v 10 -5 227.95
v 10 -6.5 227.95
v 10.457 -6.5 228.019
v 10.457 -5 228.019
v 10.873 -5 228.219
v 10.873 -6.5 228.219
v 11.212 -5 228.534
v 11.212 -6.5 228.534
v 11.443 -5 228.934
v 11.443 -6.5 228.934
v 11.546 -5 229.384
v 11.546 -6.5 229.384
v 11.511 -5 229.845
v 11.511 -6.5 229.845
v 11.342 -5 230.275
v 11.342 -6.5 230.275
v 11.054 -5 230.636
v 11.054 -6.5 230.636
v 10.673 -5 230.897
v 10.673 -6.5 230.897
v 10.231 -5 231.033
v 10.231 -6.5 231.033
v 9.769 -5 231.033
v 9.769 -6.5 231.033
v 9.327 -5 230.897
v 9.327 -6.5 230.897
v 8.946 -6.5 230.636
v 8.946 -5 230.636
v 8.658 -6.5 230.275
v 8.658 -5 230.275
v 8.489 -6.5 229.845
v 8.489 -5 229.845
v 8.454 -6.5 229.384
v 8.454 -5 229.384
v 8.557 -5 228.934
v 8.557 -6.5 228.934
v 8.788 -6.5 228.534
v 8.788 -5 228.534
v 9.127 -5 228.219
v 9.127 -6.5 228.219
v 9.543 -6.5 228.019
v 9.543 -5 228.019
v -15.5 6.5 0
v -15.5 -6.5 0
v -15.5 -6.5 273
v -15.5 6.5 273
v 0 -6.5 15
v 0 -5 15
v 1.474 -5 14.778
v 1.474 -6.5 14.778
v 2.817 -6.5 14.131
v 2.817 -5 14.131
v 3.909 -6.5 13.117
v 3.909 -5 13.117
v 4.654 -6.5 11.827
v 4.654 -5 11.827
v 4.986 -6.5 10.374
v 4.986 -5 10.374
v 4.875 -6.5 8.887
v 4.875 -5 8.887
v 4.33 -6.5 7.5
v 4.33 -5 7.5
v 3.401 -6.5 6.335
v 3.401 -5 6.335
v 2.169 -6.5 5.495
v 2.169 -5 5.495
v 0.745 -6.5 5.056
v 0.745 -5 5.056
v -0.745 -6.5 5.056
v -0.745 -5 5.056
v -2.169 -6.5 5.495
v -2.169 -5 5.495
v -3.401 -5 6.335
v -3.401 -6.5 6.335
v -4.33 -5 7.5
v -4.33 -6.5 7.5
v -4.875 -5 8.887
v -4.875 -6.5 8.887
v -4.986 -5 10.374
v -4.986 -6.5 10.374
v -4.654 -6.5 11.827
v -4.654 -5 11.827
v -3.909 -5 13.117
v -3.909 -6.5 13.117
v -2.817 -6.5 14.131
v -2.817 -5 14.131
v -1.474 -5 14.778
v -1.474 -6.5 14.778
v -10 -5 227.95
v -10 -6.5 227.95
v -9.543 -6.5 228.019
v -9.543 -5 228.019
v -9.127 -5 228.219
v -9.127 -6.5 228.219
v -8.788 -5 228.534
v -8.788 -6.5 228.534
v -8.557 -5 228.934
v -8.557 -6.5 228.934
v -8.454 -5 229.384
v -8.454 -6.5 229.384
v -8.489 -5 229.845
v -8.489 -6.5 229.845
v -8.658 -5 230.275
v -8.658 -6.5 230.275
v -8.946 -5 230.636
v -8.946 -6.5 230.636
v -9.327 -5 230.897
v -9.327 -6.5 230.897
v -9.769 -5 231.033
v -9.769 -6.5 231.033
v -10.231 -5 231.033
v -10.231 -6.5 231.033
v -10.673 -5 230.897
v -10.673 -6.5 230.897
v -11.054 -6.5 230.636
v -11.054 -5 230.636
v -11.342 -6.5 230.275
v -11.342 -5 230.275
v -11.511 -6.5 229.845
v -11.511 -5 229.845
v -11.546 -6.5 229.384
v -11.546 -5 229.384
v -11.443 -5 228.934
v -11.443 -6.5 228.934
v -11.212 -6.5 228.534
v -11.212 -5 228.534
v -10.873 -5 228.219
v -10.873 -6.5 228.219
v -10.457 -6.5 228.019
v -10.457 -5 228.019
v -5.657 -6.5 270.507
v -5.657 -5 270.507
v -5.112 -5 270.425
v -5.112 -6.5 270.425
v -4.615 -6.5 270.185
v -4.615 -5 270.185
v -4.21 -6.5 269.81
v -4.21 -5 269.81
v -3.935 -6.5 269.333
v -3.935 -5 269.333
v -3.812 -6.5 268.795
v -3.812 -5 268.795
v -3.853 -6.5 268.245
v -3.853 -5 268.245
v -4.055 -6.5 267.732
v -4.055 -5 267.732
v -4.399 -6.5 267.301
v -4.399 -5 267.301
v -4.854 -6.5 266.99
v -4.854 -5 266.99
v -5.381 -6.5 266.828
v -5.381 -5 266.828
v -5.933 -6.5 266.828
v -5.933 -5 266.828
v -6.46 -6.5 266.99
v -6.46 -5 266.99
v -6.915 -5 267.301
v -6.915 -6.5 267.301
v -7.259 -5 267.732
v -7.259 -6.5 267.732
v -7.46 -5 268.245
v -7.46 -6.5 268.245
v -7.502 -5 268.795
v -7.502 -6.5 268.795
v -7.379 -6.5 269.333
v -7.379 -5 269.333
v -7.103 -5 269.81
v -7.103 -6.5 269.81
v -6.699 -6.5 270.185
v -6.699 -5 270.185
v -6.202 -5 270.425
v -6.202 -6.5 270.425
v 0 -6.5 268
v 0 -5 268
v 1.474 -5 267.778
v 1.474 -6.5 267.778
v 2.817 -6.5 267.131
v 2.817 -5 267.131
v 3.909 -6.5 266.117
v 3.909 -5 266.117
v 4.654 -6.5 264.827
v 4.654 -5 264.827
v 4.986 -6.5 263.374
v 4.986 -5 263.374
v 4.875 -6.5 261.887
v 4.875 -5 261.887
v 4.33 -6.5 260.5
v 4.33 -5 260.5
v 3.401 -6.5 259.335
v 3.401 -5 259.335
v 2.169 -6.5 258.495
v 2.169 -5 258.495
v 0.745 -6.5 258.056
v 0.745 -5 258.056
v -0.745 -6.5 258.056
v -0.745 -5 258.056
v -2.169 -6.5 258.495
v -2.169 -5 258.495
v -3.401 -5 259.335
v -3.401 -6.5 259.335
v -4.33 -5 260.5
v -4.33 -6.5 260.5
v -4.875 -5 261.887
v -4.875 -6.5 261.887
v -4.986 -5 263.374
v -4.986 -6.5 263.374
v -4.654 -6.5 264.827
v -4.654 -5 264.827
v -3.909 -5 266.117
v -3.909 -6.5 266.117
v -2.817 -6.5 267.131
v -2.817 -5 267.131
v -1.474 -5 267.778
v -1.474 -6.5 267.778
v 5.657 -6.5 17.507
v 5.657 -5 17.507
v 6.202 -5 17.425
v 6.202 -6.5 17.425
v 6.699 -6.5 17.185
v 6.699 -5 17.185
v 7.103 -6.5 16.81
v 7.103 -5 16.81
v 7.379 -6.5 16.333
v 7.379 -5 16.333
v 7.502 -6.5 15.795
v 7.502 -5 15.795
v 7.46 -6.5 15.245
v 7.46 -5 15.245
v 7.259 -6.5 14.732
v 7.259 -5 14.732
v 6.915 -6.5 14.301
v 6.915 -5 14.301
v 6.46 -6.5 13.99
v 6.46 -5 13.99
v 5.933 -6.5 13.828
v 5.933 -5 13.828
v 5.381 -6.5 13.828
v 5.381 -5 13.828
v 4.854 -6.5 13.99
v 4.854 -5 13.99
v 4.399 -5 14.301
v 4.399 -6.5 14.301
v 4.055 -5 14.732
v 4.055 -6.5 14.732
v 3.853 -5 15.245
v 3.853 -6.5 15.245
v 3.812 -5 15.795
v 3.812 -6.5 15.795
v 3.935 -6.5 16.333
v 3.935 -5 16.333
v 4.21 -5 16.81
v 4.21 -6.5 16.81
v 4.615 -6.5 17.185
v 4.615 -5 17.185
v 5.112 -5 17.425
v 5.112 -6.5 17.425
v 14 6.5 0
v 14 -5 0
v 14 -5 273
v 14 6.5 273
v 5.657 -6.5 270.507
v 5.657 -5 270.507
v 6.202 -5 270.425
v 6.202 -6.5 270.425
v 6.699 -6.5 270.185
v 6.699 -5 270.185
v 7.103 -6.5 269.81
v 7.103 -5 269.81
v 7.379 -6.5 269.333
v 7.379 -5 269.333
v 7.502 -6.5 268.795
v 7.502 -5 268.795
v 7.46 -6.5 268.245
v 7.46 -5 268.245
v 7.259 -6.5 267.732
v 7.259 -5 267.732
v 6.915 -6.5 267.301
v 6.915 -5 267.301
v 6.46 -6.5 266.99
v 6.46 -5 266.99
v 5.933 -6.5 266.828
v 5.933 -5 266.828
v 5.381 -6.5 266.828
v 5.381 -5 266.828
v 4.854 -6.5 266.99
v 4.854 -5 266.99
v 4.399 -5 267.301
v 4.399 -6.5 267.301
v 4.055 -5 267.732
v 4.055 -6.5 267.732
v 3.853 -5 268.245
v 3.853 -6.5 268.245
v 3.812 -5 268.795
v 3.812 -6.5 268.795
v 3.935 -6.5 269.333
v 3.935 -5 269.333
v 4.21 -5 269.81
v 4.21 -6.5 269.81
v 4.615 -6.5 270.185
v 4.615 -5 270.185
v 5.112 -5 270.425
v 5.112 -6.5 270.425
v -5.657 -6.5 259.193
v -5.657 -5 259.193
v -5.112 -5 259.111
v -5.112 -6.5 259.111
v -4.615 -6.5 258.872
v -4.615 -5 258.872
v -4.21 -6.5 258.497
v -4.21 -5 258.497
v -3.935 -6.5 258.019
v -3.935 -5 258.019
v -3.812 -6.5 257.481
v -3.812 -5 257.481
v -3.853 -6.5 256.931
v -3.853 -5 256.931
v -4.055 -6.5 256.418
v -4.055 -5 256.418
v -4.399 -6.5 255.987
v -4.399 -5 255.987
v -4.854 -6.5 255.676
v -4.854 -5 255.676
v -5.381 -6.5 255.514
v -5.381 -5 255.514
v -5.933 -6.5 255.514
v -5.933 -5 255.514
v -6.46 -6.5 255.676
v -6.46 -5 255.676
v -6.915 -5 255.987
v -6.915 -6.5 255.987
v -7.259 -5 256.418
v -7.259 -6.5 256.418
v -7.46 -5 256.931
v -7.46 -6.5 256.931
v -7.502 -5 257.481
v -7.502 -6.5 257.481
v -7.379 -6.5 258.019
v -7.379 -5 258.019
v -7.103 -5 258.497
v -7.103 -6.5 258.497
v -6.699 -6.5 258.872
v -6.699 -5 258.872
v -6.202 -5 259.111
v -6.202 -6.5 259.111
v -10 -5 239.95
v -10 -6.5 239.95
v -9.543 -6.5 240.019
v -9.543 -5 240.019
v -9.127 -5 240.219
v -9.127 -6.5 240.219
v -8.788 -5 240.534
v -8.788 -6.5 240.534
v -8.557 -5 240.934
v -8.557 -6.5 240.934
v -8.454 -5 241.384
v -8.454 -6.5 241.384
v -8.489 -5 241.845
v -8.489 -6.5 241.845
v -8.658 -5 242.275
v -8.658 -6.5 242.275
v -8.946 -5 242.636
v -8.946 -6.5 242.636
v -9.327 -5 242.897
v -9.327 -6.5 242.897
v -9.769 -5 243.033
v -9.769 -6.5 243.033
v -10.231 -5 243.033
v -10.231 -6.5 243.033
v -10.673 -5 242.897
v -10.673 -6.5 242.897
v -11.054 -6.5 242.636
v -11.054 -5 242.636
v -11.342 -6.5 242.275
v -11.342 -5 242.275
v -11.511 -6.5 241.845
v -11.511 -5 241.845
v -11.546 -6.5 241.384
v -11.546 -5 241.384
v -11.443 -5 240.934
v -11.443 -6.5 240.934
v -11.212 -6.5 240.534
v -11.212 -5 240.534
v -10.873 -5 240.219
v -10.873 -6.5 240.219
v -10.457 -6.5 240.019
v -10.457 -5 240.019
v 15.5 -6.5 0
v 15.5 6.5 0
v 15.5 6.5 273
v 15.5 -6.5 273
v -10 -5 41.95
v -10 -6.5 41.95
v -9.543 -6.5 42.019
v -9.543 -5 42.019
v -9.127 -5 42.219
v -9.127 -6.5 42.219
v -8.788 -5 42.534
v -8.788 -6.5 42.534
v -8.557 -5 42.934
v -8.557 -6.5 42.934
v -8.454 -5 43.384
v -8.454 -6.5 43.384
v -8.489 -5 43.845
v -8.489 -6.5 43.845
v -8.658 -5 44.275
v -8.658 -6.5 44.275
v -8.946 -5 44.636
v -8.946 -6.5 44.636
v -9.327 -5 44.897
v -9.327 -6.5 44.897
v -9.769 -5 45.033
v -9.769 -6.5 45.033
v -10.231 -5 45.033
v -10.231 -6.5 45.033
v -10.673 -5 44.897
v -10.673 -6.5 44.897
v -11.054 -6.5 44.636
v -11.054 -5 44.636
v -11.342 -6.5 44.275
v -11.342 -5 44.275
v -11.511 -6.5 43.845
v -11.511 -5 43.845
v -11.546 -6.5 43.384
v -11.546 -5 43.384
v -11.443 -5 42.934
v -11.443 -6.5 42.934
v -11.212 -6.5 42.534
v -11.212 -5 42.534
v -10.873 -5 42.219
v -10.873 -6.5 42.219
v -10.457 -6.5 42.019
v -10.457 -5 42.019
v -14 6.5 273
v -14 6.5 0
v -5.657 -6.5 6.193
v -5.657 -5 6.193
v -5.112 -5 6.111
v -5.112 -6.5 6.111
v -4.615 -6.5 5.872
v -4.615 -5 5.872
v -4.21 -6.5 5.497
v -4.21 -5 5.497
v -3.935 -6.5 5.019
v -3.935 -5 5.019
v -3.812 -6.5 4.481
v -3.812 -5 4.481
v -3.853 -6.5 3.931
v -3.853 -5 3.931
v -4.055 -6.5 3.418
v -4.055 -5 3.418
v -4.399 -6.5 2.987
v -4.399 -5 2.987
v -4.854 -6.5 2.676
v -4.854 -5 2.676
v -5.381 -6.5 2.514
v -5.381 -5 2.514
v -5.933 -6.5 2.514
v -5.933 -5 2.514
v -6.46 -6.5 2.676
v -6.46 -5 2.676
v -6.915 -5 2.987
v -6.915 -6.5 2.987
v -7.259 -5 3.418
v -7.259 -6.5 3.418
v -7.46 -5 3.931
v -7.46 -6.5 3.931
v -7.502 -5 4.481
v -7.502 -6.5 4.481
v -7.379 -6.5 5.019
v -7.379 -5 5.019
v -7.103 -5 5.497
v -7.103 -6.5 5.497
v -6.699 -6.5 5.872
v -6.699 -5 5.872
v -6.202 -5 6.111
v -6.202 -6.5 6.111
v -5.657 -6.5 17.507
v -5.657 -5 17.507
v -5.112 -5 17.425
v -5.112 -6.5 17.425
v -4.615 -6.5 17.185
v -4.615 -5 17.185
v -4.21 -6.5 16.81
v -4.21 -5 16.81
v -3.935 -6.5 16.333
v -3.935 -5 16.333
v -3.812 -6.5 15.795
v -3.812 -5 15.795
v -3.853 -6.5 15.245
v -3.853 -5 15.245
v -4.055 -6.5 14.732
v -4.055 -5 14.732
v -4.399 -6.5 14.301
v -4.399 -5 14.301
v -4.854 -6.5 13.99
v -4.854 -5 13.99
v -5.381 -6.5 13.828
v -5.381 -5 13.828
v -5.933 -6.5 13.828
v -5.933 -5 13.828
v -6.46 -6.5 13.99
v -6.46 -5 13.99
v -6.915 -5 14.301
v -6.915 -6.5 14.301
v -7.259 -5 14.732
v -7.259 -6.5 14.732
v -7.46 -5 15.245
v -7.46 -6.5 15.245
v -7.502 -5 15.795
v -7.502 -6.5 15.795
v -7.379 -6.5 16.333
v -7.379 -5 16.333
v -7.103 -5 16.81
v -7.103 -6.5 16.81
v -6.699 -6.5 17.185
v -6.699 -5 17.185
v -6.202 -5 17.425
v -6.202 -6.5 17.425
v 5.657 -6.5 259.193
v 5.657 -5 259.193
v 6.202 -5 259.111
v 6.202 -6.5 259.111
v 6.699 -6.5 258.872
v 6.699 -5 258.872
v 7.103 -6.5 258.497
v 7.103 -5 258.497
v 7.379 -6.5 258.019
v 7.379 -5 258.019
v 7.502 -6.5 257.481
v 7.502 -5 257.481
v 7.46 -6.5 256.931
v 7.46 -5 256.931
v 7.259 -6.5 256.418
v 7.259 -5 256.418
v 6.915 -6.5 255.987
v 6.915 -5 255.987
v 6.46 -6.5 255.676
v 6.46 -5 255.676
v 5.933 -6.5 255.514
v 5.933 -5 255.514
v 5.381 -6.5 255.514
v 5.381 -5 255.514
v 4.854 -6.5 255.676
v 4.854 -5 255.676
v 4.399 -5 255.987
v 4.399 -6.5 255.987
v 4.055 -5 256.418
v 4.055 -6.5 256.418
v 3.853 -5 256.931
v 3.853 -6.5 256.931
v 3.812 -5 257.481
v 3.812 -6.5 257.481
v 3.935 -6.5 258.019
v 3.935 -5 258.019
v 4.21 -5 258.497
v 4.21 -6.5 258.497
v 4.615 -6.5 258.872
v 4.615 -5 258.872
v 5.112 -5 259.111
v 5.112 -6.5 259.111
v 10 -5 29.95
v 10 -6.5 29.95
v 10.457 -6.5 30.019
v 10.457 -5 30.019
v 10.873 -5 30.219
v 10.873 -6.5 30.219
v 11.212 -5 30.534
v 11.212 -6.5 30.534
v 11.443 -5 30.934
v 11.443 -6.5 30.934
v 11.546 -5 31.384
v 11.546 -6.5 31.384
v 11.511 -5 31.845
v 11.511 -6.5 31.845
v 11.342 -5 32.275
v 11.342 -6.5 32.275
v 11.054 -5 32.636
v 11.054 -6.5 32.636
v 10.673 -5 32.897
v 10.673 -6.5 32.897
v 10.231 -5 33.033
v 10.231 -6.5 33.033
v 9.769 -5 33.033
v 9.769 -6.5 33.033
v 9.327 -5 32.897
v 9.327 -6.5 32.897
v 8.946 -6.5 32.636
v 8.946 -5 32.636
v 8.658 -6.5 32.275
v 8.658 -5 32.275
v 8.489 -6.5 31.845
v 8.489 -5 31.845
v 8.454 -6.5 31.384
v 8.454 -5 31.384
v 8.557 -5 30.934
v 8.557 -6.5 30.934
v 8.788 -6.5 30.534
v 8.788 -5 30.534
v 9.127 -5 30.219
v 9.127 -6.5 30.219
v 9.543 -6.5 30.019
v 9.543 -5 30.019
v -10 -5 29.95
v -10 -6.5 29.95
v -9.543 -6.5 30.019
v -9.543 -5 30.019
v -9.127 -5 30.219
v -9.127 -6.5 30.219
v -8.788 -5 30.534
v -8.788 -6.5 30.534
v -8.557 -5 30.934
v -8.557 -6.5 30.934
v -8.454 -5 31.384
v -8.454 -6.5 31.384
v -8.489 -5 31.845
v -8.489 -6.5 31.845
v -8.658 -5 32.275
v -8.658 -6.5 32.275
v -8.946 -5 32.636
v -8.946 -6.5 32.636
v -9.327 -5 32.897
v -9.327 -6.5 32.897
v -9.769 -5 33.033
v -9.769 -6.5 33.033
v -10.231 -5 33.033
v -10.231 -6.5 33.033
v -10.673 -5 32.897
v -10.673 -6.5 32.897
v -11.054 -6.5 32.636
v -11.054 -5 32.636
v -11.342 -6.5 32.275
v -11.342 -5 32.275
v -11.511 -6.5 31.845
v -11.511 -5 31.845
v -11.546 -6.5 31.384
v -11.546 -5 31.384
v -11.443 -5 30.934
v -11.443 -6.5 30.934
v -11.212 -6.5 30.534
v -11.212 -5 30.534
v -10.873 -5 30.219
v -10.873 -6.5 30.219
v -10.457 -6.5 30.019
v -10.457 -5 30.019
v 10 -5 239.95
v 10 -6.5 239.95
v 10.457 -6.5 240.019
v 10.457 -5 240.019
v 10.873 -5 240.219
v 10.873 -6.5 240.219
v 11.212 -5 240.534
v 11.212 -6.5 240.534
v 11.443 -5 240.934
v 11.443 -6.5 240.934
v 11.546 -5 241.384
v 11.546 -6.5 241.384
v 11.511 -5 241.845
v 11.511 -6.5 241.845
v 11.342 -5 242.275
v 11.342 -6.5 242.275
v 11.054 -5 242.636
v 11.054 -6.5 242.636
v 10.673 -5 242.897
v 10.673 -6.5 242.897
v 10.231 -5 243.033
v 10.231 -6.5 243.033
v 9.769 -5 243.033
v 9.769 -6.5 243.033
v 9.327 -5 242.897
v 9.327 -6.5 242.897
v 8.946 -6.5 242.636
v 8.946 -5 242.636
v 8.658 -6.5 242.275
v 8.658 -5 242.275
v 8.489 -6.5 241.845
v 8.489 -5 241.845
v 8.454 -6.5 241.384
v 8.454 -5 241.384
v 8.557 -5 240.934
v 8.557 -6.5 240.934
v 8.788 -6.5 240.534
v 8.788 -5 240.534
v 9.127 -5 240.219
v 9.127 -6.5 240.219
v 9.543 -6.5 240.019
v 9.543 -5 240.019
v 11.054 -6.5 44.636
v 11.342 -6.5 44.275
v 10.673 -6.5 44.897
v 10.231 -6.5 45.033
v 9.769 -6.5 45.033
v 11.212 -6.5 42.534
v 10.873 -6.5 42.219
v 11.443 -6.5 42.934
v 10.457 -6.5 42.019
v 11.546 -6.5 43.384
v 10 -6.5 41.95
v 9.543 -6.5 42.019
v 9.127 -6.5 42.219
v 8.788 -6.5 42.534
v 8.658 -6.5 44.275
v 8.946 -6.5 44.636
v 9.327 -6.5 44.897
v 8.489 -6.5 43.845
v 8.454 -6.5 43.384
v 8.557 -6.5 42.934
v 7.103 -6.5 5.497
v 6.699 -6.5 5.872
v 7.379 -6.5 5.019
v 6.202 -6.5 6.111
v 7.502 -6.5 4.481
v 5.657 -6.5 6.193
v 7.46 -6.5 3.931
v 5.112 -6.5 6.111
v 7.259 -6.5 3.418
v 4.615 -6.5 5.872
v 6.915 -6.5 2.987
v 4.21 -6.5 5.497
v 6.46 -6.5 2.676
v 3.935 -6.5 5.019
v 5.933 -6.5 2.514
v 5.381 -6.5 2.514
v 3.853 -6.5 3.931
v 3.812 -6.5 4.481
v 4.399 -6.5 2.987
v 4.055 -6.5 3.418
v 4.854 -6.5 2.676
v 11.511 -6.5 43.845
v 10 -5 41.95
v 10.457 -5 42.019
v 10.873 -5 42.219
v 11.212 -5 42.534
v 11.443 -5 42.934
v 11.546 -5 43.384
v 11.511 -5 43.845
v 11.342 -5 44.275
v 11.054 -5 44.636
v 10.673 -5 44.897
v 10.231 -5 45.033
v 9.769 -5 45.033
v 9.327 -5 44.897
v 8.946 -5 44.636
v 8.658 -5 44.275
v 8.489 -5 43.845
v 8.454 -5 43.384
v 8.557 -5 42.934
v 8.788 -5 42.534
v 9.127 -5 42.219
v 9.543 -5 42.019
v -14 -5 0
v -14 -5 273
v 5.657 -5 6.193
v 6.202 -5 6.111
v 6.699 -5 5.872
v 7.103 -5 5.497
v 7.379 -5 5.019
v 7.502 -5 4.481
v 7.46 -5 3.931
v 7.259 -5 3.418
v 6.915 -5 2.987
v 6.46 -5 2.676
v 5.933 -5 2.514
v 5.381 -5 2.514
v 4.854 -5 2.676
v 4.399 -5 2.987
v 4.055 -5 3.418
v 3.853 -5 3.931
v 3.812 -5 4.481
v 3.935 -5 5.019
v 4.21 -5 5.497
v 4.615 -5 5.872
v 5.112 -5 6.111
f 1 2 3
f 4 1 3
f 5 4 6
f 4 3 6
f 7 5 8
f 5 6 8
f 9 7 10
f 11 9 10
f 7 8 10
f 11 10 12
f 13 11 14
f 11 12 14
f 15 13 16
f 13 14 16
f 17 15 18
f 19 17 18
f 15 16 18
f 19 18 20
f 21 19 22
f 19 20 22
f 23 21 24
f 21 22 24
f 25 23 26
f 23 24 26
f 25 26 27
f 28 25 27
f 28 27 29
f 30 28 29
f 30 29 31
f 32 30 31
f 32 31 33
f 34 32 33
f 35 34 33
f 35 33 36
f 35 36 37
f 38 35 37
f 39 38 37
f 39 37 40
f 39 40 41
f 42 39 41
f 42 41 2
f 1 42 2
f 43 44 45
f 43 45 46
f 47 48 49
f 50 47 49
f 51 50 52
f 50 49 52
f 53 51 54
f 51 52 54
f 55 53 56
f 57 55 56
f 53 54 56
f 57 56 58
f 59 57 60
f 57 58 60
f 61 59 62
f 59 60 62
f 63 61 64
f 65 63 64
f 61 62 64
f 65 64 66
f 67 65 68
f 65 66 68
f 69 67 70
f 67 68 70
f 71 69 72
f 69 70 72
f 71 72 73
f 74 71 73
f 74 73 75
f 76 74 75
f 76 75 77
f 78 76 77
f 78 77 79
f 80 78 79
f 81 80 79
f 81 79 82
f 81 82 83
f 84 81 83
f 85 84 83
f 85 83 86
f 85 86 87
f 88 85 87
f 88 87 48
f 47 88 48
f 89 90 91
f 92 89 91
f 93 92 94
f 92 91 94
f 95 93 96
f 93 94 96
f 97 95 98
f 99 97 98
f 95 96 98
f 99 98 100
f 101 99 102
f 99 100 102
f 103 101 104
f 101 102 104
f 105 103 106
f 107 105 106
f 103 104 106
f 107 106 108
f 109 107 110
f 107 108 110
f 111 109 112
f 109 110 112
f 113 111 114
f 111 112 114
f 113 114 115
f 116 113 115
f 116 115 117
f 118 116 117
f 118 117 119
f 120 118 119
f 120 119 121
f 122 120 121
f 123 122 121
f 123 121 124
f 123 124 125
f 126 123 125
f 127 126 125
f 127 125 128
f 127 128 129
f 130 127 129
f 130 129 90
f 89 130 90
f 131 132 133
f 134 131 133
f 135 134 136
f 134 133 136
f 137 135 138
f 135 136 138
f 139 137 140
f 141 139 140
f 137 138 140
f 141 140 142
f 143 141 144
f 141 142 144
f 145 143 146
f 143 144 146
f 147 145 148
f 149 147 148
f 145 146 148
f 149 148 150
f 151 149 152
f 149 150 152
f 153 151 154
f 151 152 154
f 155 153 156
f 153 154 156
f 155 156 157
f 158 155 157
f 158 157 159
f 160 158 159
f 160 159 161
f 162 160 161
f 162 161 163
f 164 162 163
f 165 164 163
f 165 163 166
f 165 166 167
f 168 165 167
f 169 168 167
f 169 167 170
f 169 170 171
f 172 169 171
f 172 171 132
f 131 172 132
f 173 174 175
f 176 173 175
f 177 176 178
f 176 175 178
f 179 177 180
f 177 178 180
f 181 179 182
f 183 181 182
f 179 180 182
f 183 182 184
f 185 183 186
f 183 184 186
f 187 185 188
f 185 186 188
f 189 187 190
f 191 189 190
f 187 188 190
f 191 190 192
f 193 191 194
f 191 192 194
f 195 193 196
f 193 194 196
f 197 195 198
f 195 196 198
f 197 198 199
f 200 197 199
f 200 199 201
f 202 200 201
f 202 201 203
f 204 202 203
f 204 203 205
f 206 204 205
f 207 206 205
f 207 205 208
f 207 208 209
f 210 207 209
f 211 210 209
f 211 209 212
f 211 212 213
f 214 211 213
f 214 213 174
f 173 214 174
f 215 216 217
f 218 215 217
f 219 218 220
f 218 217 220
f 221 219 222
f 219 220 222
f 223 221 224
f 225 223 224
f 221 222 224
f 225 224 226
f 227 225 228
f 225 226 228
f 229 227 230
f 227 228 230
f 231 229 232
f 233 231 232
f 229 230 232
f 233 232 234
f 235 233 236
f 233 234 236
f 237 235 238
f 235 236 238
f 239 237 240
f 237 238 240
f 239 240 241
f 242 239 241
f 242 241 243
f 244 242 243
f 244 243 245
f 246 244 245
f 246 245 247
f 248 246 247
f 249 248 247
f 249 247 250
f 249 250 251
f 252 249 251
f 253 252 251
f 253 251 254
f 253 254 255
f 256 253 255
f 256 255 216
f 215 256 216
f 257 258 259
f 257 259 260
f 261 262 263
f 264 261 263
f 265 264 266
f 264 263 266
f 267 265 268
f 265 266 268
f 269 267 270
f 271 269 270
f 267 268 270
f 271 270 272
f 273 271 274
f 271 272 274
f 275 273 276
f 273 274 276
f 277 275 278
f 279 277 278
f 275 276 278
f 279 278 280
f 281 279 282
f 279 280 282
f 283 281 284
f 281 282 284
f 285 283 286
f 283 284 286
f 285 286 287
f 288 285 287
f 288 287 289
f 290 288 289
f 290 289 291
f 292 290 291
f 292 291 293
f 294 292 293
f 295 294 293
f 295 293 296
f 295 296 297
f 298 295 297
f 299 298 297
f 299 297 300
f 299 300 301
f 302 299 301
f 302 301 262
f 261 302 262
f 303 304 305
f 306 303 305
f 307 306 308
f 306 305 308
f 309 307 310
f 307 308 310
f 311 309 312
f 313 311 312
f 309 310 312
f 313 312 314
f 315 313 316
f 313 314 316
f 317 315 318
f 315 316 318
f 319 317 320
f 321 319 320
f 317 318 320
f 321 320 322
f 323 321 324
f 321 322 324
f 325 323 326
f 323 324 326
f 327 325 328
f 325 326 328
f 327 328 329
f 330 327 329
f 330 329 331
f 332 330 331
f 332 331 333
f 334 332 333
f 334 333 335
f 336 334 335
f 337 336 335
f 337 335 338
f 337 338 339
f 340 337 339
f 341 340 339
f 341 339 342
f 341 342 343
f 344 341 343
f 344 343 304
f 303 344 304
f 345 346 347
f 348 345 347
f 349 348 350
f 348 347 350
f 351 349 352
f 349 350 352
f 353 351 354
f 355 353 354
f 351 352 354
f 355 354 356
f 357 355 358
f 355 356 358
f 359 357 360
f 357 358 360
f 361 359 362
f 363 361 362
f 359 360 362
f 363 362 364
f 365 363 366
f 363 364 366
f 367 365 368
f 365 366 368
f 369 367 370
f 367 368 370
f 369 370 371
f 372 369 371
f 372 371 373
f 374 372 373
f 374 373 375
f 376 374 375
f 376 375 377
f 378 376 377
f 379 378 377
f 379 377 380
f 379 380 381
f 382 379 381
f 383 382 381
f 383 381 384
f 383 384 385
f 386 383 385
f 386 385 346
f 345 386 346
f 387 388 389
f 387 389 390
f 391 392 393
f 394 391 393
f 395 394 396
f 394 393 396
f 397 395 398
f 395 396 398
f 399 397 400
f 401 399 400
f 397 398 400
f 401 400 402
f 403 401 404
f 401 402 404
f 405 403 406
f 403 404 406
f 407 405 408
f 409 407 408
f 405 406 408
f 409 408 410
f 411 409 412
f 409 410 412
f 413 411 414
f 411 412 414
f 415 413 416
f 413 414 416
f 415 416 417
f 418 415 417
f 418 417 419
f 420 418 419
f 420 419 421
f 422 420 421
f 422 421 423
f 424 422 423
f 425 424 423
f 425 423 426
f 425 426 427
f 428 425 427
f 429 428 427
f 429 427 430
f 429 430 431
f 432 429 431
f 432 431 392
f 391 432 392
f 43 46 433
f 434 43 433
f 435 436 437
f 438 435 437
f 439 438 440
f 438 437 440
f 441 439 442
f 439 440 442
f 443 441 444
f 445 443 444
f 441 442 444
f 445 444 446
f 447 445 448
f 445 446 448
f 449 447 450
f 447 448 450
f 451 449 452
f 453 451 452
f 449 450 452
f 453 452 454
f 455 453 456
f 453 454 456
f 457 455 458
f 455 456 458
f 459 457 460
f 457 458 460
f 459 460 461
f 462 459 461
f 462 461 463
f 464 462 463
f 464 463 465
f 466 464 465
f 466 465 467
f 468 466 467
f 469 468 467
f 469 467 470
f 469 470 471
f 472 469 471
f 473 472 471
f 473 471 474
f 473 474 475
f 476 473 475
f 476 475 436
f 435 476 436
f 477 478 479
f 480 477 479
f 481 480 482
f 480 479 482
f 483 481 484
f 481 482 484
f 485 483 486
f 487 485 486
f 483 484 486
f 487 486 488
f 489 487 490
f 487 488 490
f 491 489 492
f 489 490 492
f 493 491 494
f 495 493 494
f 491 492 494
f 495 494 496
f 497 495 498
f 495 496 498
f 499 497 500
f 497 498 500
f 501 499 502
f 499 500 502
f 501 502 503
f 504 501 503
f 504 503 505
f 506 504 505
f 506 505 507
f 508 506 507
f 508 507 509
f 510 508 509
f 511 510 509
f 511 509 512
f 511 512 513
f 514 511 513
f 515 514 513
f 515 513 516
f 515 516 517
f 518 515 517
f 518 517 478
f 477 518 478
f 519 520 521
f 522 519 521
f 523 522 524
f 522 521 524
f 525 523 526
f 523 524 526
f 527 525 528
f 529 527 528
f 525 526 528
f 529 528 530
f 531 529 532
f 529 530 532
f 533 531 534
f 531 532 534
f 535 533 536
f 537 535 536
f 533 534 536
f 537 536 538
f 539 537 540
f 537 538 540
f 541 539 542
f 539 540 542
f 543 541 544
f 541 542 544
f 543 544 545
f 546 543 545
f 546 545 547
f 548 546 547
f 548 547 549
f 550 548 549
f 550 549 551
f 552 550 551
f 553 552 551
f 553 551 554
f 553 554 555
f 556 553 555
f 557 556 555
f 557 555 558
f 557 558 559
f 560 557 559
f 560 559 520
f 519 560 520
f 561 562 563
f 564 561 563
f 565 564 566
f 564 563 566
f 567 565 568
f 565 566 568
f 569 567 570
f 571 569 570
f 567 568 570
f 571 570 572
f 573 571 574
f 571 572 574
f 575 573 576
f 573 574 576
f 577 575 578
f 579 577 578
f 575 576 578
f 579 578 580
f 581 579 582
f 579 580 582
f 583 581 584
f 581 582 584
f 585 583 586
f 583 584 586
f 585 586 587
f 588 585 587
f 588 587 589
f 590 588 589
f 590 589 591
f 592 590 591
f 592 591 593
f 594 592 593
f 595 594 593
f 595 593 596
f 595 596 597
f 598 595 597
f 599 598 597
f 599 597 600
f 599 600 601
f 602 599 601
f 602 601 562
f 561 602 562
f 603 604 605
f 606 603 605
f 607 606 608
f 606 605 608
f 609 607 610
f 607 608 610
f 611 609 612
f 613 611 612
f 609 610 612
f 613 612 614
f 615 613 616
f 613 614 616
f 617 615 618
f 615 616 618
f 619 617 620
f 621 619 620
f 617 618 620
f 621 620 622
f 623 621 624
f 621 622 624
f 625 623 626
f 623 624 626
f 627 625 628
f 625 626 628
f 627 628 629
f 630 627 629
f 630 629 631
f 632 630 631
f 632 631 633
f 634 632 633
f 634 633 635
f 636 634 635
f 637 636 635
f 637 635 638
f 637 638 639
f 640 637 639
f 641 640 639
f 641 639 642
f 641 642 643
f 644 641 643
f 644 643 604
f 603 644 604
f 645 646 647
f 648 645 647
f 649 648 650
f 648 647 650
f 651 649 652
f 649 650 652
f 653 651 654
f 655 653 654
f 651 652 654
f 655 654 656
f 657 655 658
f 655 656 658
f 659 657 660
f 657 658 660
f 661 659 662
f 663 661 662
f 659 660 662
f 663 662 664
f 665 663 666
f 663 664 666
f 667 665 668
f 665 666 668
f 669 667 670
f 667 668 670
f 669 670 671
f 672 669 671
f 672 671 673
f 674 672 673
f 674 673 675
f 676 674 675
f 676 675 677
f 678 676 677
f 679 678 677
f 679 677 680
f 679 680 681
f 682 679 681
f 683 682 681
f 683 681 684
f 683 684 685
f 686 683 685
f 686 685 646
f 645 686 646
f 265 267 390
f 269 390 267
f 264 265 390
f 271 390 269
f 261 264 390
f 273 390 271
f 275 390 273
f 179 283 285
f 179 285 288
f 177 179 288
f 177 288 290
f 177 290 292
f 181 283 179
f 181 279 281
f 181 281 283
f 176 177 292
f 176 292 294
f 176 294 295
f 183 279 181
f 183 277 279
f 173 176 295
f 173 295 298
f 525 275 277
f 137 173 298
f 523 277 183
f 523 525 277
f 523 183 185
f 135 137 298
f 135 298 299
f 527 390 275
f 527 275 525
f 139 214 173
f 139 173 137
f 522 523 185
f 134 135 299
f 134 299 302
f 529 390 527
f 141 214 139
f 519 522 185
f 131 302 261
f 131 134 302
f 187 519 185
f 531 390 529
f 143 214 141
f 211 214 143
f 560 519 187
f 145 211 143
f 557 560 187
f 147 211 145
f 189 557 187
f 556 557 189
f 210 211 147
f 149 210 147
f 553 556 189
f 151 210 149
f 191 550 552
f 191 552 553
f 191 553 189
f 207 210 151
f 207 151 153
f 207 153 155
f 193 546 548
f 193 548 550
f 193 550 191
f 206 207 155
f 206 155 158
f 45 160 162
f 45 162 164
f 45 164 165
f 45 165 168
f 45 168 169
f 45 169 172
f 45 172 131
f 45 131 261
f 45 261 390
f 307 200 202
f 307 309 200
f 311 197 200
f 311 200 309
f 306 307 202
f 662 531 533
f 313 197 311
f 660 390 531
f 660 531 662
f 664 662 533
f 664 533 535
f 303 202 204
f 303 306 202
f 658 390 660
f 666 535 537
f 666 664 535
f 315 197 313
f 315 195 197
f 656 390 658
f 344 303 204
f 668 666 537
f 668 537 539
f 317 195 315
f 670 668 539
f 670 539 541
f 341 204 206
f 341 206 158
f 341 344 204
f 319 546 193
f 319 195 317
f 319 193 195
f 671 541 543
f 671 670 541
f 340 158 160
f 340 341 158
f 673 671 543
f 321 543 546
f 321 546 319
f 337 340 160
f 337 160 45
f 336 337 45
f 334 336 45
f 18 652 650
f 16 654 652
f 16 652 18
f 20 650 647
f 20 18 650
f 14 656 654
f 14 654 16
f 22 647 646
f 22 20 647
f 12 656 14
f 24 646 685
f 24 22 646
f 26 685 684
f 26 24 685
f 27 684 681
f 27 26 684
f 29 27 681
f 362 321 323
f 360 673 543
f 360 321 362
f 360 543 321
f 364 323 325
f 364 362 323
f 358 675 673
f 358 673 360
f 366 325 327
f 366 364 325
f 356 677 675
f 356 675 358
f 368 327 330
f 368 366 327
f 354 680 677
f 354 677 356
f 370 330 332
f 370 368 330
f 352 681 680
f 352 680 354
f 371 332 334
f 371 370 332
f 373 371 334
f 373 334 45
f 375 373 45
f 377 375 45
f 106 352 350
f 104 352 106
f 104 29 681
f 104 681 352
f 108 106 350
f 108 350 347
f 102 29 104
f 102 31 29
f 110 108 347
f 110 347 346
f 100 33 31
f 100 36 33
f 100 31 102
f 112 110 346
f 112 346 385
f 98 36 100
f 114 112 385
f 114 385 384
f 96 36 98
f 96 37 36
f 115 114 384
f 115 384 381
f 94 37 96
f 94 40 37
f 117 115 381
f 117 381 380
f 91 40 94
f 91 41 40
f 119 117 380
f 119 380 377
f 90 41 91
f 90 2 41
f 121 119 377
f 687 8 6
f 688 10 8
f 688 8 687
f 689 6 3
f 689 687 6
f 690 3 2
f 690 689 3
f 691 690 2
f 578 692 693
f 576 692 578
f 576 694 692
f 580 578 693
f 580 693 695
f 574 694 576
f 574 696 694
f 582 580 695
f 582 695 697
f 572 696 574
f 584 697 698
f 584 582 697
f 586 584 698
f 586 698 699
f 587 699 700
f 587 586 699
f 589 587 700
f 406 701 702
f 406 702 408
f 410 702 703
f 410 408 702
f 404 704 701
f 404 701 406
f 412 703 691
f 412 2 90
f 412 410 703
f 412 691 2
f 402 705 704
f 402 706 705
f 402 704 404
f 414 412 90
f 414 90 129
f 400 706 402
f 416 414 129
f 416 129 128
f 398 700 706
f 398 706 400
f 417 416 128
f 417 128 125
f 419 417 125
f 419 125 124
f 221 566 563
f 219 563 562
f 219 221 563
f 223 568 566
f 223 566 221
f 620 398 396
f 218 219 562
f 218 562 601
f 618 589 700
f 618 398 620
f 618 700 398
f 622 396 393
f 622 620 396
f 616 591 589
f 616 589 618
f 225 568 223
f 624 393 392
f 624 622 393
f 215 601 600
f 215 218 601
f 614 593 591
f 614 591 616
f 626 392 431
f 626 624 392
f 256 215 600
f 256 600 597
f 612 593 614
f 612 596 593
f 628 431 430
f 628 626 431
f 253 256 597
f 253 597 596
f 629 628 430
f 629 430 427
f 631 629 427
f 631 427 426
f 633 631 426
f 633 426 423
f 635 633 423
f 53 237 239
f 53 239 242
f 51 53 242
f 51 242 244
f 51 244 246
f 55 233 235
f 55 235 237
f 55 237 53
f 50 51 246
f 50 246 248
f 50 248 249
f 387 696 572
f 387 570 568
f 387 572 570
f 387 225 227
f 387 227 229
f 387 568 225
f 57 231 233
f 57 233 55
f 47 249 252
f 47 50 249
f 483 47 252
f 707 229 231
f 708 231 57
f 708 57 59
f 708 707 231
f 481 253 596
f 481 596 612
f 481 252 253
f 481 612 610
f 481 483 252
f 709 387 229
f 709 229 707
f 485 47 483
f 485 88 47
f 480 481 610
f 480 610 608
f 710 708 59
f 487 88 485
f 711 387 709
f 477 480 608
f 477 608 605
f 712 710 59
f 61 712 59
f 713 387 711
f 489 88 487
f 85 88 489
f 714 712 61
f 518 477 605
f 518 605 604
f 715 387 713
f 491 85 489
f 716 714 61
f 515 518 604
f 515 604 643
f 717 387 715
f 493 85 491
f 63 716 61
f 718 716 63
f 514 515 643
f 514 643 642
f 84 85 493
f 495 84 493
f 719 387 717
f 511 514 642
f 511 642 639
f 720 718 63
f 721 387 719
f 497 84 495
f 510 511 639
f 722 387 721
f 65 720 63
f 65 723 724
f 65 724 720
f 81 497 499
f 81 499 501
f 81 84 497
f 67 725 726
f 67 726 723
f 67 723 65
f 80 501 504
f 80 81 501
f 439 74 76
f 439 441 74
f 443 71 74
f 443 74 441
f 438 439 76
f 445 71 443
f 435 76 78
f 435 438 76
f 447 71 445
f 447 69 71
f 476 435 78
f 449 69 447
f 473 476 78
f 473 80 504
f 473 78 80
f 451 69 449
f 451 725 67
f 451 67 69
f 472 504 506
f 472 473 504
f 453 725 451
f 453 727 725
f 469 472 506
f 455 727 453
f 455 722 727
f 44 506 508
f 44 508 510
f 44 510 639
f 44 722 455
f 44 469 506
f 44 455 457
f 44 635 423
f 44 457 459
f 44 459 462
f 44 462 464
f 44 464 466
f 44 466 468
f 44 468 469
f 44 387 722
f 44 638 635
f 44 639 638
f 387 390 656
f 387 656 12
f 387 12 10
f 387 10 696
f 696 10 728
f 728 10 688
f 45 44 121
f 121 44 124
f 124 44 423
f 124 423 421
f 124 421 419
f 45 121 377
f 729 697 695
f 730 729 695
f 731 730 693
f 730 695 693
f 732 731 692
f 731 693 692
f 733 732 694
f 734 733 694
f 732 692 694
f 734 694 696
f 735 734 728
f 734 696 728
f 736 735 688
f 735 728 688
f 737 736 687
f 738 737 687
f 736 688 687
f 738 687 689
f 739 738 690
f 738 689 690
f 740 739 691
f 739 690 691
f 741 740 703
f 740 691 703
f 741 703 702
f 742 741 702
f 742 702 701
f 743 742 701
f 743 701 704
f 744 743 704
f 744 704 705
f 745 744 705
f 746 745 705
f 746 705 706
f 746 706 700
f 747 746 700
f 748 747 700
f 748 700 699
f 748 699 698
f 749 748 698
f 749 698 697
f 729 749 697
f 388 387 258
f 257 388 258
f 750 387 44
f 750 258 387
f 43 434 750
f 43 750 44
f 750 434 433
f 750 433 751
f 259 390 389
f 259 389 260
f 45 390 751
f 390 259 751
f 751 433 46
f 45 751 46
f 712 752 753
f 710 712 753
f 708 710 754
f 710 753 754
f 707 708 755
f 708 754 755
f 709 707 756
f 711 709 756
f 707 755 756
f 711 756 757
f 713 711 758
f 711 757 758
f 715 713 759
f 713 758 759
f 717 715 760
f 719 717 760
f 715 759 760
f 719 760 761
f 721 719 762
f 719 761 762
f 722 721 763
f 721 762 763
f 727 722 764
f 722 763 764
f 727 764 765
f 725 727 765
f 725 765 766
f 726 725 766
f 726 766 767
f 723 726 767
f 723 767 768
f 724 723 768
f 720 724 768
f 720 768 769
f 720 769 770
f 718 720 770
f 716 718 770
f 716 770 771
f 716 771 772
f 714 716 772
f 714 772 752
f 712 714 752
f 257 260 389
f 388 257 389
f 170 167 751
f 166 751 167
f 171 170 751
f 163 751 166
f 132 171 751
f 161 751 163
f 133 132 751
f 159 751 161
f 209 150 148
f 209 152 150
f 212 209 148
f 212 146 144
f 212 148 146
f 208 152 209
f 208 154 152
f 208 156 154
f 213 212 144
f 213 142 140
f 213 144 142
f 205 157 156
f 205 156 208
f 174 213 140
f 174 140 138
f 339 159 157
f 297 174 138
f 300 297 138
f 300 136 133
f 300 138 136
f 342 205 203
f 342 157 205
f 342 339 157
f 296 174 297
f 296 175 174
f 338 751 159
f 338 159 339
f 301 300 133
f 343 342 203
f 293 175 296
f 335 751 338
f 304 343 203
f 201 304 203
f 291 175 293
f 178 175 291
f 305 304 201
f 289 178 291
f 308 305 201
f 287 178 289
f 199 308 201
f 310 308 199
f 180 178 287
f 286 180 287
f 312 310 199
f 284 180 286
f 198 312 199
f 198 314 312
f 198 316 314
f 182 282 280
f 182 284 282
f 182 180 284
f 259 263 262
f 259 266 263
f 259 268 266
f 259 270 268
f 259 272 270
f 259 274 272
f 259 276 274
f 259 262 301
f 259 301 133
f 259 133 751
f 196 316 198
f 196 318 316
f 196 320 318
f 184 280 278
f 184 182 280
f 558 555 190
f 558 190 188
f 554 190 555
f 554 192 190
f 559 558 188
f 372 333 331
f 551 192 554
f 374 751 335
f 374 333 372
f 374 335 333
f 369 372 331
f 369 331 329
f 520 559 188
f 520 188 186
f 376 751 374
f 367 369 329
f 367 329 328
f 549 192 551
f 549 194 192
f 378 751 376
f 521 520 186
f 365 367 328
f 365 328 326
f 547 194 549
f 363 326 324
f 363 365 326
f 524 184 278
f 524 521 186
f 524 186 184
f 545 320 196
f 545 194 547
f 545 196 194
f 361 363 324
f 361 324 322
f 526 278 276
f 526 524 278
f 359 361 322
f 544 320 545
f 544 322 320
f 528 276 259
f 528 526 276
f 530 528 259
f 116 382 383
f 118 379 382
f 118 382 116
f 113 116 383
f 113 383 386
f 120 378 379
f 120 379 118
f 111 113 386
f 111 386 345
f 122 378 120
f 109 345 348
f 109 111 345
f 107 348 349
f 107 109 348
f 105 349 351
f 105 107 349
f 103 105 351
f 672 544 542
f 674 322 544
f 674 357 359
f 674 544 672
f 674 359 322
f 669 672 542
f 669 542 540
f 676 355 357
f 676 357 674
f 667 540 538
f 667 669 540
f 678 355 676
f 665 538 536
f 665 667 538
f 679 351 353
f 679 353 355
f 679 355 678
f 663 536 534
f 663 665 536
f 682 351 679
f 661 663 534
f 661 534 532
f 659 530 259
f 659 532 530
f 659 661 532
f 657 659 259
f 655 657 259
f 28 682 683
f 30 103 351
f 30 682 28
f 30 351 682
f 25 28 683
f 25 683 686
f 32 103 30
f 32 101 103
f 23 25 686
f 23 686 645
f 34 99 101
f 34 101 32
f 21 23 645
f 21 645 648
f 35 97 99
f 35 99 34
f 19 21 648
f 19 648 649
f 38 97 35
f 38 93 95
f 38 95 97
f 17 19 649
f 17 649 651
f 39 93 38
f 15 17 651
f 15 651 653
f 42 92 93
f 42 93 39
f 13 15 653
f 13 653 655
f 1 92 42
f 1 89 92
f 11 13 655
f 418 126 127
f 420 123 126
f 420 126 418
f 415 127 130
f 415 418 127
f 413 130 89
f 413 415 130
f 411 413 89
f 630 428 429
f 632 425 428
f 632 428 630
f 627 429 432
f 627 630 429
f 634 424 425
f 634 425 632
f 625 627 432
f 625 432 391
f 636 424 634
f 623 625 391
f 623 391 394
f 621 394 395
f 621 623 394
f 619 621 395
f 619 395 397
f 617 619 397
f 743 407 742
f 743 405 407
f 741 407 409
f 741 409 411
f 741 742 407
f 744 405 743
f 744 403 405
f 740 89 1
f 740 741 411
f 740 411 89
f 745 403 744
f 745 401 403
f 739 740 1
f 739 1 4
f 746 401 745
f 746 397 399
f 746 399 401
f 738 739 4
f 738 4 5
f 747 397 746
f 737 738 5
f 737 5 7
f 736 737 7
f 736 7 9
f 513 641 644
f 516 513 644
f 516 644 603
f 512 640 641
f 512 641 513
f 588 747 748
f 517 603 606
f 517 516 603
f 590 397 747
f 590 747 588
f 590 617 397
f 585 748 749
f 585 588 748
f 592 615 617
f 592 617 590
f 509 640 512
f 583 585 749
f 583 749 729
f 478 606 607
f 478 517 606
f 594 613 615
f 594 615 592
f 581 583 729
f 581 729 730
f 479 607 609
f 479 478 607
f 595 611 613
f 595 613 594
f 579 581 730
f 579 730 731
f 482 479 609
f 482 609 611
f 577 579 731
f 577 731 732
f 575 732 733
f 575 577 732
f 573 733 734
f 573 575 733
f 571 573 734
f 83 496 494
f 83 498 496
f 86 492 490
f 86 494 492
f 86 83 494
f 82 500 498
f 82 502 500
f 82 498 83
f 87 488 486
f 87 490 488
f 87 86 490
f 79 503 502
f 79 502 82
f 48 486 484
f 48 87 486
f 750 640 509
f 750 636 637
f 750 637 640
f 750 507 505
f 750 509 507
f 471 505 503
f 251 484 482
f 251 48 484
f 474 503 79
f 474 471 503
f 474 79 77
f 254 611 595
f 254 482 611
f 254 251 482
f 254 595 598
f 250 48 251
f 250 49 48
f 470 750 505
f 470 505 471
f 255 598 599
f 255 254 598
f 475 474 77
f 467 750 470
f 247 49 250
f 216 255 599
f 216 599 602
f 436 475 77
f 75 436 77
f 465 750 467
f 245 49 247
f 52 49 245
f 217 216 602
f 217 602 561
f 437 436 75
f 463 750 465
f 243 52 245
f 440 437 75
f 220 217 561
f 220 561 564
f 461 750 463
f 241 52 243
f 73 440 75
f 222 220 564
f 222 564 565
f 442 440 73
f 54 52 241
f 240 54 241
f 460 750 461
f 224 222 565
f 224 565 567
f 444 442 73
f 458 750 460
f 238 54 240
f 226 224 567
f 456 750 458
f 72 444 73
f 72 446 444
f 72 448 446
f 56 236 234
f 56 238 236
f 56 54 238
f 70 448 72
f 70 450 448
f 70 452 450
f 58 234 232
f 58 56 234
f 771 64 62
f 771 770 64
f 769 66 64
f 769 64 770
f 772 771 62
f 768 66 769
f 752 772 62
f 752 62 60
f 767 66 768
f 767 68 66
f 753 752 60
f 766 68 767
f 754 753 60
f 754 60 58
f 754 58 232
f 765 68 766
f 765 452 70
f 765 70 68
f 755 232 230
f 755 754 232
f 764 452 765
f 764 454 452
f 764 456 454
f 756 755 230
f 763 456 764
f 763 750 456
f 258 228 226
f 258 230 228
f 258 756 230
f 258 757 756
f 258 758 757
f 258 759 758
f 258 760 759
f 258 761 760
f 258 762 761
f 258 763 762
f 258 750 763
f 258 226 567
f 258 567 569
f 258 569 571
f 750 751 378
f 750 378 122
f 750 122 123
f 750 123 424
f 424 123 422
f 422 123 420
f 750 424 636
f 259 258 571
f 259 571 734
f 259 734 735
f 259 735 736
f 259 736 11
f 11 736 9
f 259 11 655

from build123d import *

# Parameters (mm, degrees)
BOSS_EXTRUDE1_DEPTH = 273
SKETCH3_R           = 1.85
SKETCH3_R_2         = 5
CUT_EXTRUDE1_DEPTH  = 273
SKETCH5_R           = 1.55
CUT_EXTRUDE2_DEPTH  = 220


with BuildPart() as part:
    # Sketch1 → Boss-Extrude1 (new body)
    with BuildSketch(Plane.XY):
        Polygon((14, 6.5), (15.5, 6.5), (15.5, -6.5), (-15.5, -6.5), (-15.5, 6.5), (-14, 6.5), (-14, -5), (14, -5), align=None)
    extrude(amount=BOSS_EXTRUDE1_DEPTH)

    # Sketch3 → Cut-Extrude1 (cut)
    with BuildSketch(Plane(origin=(0, -5, 0), x_dir=(1, 0, 0), z_dir=(0, 1, 0))):
        with Locations(Location((-5.656854249, -4.343145751, 0), (0, 0, 270))):
            Circle(SKETCH3_R)
        with Locations(Location((0, -263, 0), (0, 0, 270))):
            Circle(SKETCH3_R_2)
        with Locations(Location((-5.656854249, -257.343145751, 0), (0, 0, 270))):
            Circle(SKETCH3_R)
        with Locations(Location((5.656854249, -257.343145751, 0), (0, 0, 270))):
            Circle(SKETCH3_R)
        with Locations(Location((5.656854249, -268.656854249, 0), (0, 0, 270))):
            Circle(SKETCH3_R)
        with Locations(Location((-5.656854249, -268.656854249, 0), (0, 0, 270))):
            Circle(SKETCH3_R)
        with Locations(Location((5.656854249, -4.343145751, 0), (0, 0, 270))):
            Circle(SKETCH3_R)
        with Locations(Location((5.656854249, -15.656854249, 0), (0, 0, 270))):
            Circle(SKETCH3_R)
        with Locations(Location((-5.656854249, -15.656854249, 0), (0, 0, 270))):
            Circle(SKETCH3_R)
        with Locations(Location((0, -10, 0), (0, 0, 270))):
            Circle(SKETCH3_R_2)
    extrude(amount=-CUT_EXTRUDE1_DEPTH, mode=Mode.SUBTRACT)

    # Sketch5 → Cut-Extrude2 (cut)
    with BuildSketch(Plane.XZ.offset(6.5)):
        with Locations(Location((-10, 229.5, 0), (0, 0, 270))):
            Circle(SKETCH5_R)
        with Locations(Location((-10, 241.5, 0), (0, 0, 270))):
            Circle(SKETCH5_R)
        with Locations(Location((10, 229.5, 0), (0, 0, 270))):
            Circle(SKETCH5_R)
        with Locations(Location((10, 241.5, 0), (0, 0, 270))):
            Circle(SKETCH5_R)
        with Locations(Location((10, 31.5, 0), (0, 0, 270))):
            Circle(SKETCH5_R)
        with Locations(Location((10, 43.5, 0), (0, 0, 270))):
            Circle(SKETCH5_R)
        with Locations(Location((-10, 31.5, 0), (0, 0, 270))):
            Circle(SKETCH5_R)
        with Locations(Location((-10, 43.5, 0), (0, 0, 270))):
            Circle(SKETCH5_R)
    extrude(amount=-CUT_EXTRUDE2_DEPTH, mode=Mode.SUBTRACT)


solid = part.part
